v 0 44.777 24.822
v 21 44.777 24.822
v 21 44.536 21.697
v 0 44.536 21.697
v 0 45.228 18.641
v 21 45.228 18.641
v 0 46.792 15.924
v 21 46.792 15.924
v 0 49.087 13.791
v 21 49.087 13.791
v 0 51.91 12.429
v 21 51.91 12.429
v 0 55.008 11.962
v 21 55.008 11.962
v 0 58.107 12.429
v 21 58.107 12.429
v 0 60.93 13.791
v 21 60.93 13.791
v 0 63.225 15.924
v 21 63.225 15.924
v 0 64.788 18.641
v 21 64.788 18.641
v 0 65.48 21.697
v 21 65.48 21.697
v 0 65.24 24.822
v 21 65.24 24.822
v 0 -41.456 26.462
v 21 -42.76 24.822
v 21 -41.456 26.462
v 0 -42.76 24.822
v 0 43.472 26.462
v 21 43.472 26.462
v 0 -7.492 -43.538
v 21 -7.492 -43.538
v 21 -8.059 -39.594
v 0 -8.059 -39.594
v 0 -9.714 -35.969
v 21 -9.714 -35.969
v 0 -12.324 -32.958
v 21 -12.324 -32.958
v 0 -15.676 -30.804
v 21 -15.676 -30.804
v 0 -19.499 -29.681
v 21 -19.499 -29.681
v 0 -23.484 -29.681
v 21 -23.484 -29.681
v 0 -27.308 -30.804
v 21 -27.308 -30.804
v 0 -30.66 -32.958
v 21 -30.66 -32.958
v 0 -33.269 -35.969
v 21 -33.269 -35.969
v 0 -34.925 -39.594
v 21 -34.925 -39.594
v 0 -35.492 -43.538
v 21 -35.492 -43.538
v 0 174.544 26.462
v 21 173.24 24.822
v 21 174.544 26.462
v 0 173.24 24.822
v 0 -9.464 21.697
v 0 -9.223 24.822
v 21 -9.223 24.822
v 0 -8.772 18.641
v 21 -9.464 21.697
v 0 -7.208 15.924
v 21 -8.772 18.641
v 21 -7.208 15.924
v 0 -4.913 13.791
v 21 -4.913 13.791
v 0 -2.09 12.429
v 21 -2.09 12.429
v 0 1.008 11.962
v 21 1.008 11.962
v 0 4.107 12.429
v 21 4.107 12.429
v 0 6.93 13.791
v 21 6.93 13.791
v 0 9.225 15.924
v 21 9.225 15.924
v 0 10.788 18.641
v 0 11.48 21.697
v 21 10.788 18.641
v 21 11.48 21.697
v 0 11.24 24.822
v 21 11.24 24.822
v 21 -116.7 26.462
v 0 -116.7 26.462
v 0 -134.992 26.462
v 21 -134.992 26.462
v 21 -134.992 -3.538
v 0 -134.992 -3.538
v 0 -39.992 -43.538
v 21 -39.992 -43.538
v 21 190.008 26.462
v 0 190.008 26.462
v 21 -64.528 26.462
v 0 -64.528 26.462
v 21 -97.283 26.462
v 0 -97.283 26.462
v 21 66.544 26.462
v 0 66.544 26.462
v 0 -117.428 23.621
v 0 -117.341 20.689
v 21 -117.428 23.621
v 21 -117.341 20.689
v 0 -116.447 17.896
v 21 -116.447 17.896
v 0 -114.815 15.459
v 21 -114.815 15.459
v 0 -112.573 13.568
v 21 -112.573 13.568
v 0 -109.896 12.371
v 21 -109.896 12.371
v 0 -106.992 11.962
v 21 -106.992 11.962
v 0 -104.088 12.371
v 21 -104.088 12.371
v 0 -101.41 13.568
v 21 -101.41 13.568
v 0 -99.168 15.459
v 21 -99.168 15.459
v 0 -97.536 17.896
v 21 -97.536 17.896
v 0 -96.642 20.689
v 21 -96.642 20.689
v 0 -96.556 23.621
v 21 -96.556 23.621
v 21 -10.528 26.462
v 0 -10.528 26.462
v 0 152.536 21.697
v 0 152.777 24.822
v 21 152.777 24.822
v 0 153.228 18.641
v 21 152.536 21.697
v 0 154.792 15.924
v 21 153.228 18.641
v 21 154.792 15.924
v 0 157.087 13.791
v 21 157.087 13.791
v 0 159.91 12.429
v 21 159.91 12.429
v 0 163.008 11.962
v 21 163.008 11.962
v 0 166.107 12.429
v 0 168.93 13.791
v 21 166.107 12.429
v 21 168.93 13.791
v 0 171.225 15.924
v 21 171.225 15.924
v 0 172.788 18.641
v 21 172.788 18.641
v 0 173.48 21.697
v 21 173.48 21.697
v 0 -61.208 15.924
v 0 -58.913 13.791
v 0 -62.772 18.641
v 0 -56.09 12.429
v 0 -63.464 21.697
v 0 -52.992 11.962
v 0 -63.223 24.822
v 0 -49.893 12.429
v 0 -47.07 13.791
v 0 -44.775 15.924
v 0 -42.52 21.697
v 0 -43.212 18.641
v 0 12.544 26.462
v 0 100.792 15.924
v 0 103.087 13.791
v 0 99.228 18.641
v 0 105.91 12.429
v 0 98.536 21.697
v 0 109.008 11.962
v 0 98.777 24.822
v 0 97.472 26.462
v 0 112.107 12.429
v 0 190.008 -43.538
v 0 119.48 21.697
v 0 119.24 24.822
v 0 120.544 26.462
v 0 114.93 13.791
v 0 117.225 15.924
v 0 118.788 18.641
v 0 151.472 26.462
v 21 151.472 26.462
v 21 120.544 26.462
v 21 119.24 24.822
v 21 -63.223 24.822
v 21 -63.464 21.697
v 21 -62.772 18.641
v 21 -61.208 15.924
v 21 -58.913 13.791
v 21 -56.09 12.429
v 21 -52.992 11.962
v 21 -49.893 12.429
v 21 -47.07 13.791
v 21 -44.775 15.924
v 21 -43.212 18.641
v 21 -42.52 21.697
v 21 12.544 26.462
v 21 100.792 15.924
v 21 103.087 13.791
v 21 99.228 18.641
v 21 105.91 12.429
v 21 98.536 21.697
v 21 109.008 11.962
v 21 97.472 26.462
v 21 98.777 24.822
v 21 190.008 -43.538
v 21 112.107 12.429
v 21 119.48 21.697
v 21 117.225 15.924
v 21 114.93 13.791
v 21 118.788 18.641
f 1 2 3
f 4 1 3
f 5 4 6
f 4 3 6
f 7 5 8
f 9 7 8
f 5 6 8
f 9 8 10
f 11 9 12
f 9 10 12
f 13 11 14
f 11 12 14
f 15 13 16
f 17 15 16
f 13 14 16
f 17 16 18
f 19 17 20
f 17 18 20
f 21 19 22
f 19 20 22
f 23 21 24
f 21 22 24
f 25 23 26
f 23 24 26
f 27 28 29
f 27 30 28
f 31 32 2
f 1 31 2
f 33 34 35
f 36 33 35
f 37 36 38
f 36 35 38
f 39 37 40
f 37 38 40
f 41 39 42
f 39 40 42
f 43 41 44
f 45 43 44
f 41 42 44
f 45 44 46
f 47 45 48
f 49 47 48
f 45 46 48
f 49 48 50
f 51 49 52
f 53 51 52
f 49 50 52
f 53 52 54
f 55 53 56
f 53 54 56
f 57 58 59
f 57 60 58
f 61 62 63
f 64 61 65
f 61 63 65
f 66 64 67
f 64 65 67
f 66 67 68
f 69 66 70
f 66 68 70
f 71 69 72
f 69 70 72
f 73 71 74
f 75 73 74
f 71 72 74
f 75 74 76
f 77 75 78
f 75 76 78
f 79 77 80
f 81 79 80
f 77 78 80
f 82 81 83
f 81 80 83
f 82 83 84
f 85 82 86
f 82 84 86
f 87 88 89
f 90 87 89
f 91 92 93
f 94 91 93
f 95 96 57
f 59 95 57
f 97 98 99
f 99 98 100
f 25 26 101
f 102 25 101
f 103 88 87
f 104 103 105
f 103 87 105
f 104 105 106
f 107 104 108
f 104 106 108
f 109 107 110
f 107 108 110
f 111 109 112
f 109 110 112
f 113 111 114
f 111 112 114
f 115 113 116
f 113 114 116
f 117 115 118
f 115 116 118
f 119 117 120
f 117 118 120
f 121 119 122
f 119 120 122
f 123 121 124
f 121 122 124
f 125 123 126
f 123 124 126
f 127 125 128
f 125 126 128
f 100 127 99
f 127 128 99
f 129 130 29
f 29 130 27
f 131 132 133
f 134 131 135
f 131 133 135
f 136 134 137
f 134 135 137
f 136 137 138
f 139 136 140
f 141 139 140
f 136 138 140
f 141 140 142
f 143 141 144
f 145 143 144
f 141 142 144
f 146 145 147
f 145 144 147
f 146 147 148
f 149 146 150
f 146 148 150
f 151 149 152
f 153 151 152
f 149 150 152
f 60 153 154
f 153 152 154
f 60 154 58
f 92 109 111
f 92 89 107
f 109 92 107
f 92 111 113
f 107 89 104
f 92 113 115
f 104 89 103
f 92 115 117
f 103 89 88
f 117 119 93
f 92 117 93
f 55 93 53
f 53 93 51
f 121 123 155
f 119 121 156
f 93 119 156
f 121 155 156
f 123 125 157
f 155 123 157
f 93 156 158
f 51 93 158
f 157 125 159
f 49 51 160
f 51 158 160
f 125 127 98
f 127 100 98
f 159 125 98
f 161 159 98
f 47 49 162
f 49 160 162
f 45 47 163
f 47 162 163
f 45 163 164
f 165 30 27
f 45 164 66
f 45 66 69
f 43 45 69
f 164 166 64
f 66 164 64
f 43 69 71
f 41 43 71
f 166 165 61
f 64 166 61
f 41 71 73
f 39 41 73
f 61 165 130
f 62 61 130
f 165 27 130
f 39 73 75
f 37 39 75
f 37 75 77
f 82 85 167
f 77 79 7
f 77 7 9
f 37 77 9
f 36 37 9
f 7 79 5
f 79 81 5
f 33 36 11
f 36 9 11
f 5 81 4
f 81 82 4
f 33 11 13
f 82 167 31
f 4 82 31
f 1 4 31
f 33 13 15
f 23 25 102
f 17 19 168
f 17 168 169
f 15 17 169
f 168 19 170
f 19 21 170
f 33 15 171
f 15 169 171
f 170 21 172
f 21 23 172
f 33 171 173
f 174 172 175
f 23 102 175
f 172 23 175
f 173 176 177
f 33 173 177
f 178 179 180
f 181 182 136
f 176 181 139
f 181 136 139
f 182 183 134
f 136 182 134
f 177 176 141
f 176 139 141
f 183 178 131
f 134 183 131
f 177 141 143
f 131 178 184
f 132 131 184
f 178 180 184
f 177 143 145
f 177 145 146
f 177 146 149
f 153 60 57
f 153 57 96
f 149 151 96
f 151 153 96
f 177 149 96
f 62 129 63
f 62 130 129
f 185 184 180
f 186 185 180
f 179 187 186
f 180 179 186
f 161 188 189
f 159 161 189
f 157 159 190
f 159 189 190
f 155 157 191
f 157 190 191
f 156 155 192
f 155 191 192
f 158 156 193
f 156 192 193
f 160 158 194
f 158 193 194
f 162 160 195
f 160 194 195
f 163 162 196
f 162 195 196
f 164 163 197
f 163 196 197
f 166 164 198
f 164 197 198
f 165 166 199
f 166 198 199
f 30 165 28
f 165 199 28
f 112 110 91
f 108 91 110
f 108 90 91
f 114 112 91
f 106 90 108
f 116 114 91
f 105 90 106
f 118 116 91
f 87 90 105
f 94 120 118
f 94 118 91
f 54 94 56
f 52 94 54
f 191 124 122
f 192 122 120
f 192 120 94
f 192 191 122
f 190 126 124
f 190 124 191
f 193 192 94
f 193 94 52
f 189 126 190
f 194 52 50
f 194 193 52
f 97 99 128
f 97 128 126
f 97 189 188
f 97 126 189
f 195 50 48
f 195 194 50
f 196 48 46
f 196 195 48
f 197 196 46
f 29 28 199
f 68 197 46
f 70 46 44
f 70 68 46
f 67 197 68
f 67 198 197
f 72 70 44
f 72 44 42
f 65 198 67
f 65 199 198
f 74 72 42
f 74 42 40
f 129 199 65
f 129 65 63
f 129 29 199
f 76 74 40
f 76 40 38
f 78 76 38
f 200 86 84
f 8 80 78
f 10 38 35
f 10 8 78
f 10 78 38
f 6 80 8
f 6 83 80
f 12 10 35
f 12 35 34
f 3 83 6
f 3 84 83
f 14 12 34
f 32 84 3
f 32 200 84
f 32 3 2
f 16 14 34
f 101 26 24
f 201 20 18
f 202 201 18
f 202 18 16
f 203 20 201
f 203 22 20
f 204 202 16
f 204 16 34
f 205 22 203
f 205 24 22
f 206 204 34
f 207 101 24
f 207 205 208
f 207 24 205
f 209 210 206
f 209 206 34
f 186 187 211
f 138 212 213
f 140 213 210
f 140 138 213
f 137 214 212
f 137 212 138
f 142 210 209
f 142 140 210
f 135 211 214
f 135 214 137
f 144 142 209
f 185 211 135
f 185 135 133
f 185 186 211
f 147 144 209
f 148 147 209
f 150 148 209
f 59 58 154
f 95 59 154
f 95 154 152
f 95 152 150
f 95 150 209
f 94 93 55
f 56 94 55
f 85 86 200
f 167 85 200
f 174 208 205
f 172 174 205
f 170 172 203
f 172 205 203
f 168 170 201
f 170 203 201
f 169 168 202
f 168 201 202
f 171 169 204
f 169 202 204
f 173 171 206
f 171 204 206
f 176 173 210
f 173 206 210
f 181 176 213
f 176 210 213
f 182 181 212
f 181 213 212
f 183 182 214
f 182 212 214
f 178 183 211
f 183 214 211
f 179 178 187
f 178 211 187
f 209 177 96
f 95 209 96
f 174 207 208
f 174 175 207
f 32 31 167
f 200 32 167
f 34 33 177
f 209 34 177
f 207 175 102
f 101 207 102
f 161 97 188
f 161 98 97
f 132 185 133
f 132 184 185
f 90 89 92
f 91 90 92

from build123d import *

# Parameters (mm, degrees)
F1_DEPTH    = 21
F2_R        = 10.5
F3_DEPTH    = 25
F4_T1_DEPTH = 30.3938312155
F5_R        = 14
F6_DEPTH    = 25


# Not quite as in the source:
# - a fillet or chamfer that OpenCascade refuses, or shapes differently, is made with other operations: its cross-section is extruded or revolved along the edge and cut away or added


with BuildPart() as f1:
    # F0 (on Right) → F1 (new body)
    with BuildSketch(Plane.YZ):
        Polygon((-134.9917307664, 26.4616465569), (-134.9917307664, -3.5383534431), (-39.9917307664, -43.5383534431), (190.0082692336, -43.5383534431), (190.0082692336, 26.4616465569), align=None)
    extrude(amount=F1_DEPTH)

    # F2 (on face) → F3 (cut)
    with BuildSketch(Plane.YZ.offset(21)):
        with Locations((163.0082692336, 22.4616465569)):
            Circle(F2_R)
        with Locations((109.0082692336, 22.4616465569)):
            Circle(F2_R)
        with Locations((55.0082692336, 22.4616465569)):
            Circle(F2_R)
        with Locations((1.0082692336, 22.4616465569)):
            Circle(F2_R)
        with Locations((-52.9917307664, 22.4616465569)):
            Circle(F2_R)
        with Locations((-106.9917307664, 22.4616465569)):
            Circle(F2_R)
    extrude(amount=-F3_DEPTH, mode=Mode.SUBTRACT)

    # F4: chamfer of 2 on 10 edges, made by hand

    # F4_s2 → F4_t1 (cut)
    with BuildSketch(Plane.YZ.offset(-4.6969156077)):
        with BuildLine():
            Line((-64.5776976071, 26.5242502898), (-63.1732755163, 24.7590076766))
            Line((-63.1732755163, 24.7590076766), (-63.1342989368, 24.7500173343))
            ThreePointArc((-63.1342989368, 24.7500173343), (-62.963845112, 25.6189453198), (-62.6629908996, 26.4464084616))
            Line((-62.6629908996, 26.4464084616), (-62.6999746859, 26.5016465569))
            ThreePointArc((-62.6999746859, 26.5016465569), (-63.6388361465, 26.5016465569), (-64.5776976071, 26.5642502898))
            Line((-64.5776976071, 26.5642502898), (-64.5776976071, 26.5242502898))
        make_face()
        with BuildLine():
            Line((-42.8101860166, 24.7590076766), (-41.4057639258, 26.5242502898))
            Line((-41.4057639258, 26.5242502898), (-41.4057639258, 26.5642502898))
            ThreePointArc((-41.4057639258, 26.5642502898), (-42.3446253864, 26.5016465569), (-43.283486847, 26.5016465569))
            Line((-43.283486847, 26.5016465569), (-43.3204706333, 26.4464084616))
            ThreePointArc((-43.3204706333, 26.4464084616), (-43.0196164209, 25.6189453198), (-42.8491625961, 24.7500173343))
            Line((-42.8491625961, 24.7500173343), (-42.8101860166, 24.7590076766))
        make_face()
        with BuildLine():
            Line((-10.5776976071, 26.5242502898), (-9.1732755163, 24.7590076766))
            Line((-9.1732755163, 24.7590076766), (-9.1342989368, 24.7500173343))
            ThreePointArc((-9.1342989368, 24.7500173343), (-8.963845112, 25.6189453198), (-8.6629908996, 26.4464084616))
            Line((-8.6629908996, 26.4464084616), (-8.6999746859, 26.5016465569))
            ThreePointArc((-8.6999746859, 26.5016465569), (-9.6388361465, 26.5016465569), (-10.5776976071, 26.5642502898))
            Line((-10.5776976071, 26.5642502898), (-10.5776976071, 26.5242502898))
        make_face()
        with BuildLine():
            Line((11.1898139834, 24.7590076766), (12.5942360742, 26.5242502898))
            Line((12.5942360742, 26.5242502898), (12.5942360742, 26.5642502898))
            ThreePointArc((12.5942360742, 26.5642502898), (11.6553746136, 26.5016465569), (10.716513153, 26.5016465569))
            Line((10.716513153, 26.5016465569), (10.6795293667, 26.4464084616))
            ThreePointArc((10.6795293667, 26.4464084616), (10.9803835791, 25.6189453198), (11.1508374039, 24.7500173343))
            Line((11.1508374039, 24.7500173343), (11.1898139834, 24.7590076766))
        make_face()
        with BuildLine():
            Line((43.4223023929, 26.5242502898), (44.8267244837, 24.7590076766))
            Line((44.8267244837, 24.7590076766), (44.8657010632, 24.7500173343))
            ThreePointArc((44.8657010632, 24.7500173343), (45.036154888, 25.6189453198), (45.3370091004, 26.4464084616))
            Line((45.3370091004, 26.4464084616), (45.3000253141, 26.5016465569))
            ThreePointArc((45.3000253141, 26.5016465569), (44.3611638535, 26.5016465569), (43.4223023929, 26.5642502898))
            Line((43.4223023929, 26.5642502898), (43.4223023929, 26.5242502898))
        make_face()
        with BuildLine():
            Line((65.1898139834, 24.7590076766), (66.5942360742, 26.5242502898))
            Line((66.5942360742, 26.5242502898), (66.5942360742, 26.5642502898))
            ThreePointArc((66.5942360742, 26.5642502898), (65.6553746136, 26.5016465569), (64.716513153, 26.5016465569))
            Line((64.716513153, 26.5016465569), (64.6795293667, 26.4464084616))
            ThreePointArc((64.6795293667, 26.4464084616), (64.9803835791, 25.6189453198), (65.1508374039, 24.7500173343))
            Line((65.1508374039, 24.7500173343), (65.1898139834, 24.7590076766))
        make_face()
        with BuildLine():
            Line((97.4223023929, 26.5242502898), (98.8267244837, 24.7590076766))
            Line((98.8267244837, 24.7590076766), (98.8657010632, 24.7500173343))
            ThreePointArc((98.8657010632, 24.7500173343), (99.036154888, 25.6189453198), (99.3370091004, 26.4464084616))
            Line((99.3370091004, 26.4464084616), (99.3000253141, 26.5016465569))
            ThreePointArc((99.3000253141, 26.5016465569), (98.3611638535, 26.5016465569), (97.4223023929, 26.5642502898))
            Line((97.4223023929, 26.5642502898), (97.4223023929, 26.5242502898))
        make_face()
        with BuildLine():
            Line((119.1898139834, 24.7590076766), (120.5942360742, 26.5242502898))
            Line((120.5942360742, 26.5242502898), (120.5942360742, 26.5642502898))
            ThreePointArc((120.5942360742, 26.5642502898), (119.6553746136, 26.5016465569), (118.716513153, 26.5016465569))
            Line((118.716513153, 26.5016465569), (118.6795293667, 26.4464084616))
            ThreePointArc((118.6795293667, 26.4464084616), (118.9803835791, 25.6189453198), (119.1508374039, 24.7500173343))
            Line((119.1508374039, 24.7500173343), (119.1898139834, 24.7590076766))
        make_face()
        with BuildLine():
            Line((151.4223023929, 26.5242502898), (152.8267244837, 24.7590076766))
            Line((152.8267244837, 24.7590076766), (152.8657010632, 24.7500173343))
            ThreePointArc((152.8657010632, 24.7500173343), (153.036154888, 25.6189453198), (153.3370091004, 26.4464084616))
            Line((153.3370091004, 26.4464084616), (153.3000253141, 26.5016465569))
            ThreePointArc((153.3000253141, 26.5016465569), (152.3611638535, 26.5016465569), (151.4223023929, 26.5642502898))
            Line((151.4223023929, 26.5642502898), (151.4223023929, 26.5242502898))
        make_face()
        with BuildLine():
            Line((173.1898139834, 24.7590076766), (174.5942360742, 26.5242502898))
            Line((174.5942360742, 26.5242502898), (174.5942360742, 26.5642502898))
            ThreePointArc((174.5942360742, 26.5642502898), (173.6553746136, 26.5016465569), (172.716513153, 26.5016465569))
            Line((172.716513153, 26.5016465569), (172.6795293667, 26.4464084616))
            ThreePointArc((172.6795293667, 26.4464084616), (172.9803835791, 25.6189453198), (173.1508374039, 24.7500173343))
            Line((173.1508374039, 24.7500173343), (173.1898139834, 24.7590076766))
        make_face()
    extrude(amount=F4_T1_DEPTH, mode=Mode.SUBTRACT)

    # F5 (on face) → F6 (cut)
    with BuildSketch(Plane.YZ.offset(21)):
        with Locations((-21.4917307664, -43.5383534431)):
            Circle(F5_R)
    extrude(amount=-F6_DEPTH, mode=Mode.SUBTRACT)


solid = f1.part
